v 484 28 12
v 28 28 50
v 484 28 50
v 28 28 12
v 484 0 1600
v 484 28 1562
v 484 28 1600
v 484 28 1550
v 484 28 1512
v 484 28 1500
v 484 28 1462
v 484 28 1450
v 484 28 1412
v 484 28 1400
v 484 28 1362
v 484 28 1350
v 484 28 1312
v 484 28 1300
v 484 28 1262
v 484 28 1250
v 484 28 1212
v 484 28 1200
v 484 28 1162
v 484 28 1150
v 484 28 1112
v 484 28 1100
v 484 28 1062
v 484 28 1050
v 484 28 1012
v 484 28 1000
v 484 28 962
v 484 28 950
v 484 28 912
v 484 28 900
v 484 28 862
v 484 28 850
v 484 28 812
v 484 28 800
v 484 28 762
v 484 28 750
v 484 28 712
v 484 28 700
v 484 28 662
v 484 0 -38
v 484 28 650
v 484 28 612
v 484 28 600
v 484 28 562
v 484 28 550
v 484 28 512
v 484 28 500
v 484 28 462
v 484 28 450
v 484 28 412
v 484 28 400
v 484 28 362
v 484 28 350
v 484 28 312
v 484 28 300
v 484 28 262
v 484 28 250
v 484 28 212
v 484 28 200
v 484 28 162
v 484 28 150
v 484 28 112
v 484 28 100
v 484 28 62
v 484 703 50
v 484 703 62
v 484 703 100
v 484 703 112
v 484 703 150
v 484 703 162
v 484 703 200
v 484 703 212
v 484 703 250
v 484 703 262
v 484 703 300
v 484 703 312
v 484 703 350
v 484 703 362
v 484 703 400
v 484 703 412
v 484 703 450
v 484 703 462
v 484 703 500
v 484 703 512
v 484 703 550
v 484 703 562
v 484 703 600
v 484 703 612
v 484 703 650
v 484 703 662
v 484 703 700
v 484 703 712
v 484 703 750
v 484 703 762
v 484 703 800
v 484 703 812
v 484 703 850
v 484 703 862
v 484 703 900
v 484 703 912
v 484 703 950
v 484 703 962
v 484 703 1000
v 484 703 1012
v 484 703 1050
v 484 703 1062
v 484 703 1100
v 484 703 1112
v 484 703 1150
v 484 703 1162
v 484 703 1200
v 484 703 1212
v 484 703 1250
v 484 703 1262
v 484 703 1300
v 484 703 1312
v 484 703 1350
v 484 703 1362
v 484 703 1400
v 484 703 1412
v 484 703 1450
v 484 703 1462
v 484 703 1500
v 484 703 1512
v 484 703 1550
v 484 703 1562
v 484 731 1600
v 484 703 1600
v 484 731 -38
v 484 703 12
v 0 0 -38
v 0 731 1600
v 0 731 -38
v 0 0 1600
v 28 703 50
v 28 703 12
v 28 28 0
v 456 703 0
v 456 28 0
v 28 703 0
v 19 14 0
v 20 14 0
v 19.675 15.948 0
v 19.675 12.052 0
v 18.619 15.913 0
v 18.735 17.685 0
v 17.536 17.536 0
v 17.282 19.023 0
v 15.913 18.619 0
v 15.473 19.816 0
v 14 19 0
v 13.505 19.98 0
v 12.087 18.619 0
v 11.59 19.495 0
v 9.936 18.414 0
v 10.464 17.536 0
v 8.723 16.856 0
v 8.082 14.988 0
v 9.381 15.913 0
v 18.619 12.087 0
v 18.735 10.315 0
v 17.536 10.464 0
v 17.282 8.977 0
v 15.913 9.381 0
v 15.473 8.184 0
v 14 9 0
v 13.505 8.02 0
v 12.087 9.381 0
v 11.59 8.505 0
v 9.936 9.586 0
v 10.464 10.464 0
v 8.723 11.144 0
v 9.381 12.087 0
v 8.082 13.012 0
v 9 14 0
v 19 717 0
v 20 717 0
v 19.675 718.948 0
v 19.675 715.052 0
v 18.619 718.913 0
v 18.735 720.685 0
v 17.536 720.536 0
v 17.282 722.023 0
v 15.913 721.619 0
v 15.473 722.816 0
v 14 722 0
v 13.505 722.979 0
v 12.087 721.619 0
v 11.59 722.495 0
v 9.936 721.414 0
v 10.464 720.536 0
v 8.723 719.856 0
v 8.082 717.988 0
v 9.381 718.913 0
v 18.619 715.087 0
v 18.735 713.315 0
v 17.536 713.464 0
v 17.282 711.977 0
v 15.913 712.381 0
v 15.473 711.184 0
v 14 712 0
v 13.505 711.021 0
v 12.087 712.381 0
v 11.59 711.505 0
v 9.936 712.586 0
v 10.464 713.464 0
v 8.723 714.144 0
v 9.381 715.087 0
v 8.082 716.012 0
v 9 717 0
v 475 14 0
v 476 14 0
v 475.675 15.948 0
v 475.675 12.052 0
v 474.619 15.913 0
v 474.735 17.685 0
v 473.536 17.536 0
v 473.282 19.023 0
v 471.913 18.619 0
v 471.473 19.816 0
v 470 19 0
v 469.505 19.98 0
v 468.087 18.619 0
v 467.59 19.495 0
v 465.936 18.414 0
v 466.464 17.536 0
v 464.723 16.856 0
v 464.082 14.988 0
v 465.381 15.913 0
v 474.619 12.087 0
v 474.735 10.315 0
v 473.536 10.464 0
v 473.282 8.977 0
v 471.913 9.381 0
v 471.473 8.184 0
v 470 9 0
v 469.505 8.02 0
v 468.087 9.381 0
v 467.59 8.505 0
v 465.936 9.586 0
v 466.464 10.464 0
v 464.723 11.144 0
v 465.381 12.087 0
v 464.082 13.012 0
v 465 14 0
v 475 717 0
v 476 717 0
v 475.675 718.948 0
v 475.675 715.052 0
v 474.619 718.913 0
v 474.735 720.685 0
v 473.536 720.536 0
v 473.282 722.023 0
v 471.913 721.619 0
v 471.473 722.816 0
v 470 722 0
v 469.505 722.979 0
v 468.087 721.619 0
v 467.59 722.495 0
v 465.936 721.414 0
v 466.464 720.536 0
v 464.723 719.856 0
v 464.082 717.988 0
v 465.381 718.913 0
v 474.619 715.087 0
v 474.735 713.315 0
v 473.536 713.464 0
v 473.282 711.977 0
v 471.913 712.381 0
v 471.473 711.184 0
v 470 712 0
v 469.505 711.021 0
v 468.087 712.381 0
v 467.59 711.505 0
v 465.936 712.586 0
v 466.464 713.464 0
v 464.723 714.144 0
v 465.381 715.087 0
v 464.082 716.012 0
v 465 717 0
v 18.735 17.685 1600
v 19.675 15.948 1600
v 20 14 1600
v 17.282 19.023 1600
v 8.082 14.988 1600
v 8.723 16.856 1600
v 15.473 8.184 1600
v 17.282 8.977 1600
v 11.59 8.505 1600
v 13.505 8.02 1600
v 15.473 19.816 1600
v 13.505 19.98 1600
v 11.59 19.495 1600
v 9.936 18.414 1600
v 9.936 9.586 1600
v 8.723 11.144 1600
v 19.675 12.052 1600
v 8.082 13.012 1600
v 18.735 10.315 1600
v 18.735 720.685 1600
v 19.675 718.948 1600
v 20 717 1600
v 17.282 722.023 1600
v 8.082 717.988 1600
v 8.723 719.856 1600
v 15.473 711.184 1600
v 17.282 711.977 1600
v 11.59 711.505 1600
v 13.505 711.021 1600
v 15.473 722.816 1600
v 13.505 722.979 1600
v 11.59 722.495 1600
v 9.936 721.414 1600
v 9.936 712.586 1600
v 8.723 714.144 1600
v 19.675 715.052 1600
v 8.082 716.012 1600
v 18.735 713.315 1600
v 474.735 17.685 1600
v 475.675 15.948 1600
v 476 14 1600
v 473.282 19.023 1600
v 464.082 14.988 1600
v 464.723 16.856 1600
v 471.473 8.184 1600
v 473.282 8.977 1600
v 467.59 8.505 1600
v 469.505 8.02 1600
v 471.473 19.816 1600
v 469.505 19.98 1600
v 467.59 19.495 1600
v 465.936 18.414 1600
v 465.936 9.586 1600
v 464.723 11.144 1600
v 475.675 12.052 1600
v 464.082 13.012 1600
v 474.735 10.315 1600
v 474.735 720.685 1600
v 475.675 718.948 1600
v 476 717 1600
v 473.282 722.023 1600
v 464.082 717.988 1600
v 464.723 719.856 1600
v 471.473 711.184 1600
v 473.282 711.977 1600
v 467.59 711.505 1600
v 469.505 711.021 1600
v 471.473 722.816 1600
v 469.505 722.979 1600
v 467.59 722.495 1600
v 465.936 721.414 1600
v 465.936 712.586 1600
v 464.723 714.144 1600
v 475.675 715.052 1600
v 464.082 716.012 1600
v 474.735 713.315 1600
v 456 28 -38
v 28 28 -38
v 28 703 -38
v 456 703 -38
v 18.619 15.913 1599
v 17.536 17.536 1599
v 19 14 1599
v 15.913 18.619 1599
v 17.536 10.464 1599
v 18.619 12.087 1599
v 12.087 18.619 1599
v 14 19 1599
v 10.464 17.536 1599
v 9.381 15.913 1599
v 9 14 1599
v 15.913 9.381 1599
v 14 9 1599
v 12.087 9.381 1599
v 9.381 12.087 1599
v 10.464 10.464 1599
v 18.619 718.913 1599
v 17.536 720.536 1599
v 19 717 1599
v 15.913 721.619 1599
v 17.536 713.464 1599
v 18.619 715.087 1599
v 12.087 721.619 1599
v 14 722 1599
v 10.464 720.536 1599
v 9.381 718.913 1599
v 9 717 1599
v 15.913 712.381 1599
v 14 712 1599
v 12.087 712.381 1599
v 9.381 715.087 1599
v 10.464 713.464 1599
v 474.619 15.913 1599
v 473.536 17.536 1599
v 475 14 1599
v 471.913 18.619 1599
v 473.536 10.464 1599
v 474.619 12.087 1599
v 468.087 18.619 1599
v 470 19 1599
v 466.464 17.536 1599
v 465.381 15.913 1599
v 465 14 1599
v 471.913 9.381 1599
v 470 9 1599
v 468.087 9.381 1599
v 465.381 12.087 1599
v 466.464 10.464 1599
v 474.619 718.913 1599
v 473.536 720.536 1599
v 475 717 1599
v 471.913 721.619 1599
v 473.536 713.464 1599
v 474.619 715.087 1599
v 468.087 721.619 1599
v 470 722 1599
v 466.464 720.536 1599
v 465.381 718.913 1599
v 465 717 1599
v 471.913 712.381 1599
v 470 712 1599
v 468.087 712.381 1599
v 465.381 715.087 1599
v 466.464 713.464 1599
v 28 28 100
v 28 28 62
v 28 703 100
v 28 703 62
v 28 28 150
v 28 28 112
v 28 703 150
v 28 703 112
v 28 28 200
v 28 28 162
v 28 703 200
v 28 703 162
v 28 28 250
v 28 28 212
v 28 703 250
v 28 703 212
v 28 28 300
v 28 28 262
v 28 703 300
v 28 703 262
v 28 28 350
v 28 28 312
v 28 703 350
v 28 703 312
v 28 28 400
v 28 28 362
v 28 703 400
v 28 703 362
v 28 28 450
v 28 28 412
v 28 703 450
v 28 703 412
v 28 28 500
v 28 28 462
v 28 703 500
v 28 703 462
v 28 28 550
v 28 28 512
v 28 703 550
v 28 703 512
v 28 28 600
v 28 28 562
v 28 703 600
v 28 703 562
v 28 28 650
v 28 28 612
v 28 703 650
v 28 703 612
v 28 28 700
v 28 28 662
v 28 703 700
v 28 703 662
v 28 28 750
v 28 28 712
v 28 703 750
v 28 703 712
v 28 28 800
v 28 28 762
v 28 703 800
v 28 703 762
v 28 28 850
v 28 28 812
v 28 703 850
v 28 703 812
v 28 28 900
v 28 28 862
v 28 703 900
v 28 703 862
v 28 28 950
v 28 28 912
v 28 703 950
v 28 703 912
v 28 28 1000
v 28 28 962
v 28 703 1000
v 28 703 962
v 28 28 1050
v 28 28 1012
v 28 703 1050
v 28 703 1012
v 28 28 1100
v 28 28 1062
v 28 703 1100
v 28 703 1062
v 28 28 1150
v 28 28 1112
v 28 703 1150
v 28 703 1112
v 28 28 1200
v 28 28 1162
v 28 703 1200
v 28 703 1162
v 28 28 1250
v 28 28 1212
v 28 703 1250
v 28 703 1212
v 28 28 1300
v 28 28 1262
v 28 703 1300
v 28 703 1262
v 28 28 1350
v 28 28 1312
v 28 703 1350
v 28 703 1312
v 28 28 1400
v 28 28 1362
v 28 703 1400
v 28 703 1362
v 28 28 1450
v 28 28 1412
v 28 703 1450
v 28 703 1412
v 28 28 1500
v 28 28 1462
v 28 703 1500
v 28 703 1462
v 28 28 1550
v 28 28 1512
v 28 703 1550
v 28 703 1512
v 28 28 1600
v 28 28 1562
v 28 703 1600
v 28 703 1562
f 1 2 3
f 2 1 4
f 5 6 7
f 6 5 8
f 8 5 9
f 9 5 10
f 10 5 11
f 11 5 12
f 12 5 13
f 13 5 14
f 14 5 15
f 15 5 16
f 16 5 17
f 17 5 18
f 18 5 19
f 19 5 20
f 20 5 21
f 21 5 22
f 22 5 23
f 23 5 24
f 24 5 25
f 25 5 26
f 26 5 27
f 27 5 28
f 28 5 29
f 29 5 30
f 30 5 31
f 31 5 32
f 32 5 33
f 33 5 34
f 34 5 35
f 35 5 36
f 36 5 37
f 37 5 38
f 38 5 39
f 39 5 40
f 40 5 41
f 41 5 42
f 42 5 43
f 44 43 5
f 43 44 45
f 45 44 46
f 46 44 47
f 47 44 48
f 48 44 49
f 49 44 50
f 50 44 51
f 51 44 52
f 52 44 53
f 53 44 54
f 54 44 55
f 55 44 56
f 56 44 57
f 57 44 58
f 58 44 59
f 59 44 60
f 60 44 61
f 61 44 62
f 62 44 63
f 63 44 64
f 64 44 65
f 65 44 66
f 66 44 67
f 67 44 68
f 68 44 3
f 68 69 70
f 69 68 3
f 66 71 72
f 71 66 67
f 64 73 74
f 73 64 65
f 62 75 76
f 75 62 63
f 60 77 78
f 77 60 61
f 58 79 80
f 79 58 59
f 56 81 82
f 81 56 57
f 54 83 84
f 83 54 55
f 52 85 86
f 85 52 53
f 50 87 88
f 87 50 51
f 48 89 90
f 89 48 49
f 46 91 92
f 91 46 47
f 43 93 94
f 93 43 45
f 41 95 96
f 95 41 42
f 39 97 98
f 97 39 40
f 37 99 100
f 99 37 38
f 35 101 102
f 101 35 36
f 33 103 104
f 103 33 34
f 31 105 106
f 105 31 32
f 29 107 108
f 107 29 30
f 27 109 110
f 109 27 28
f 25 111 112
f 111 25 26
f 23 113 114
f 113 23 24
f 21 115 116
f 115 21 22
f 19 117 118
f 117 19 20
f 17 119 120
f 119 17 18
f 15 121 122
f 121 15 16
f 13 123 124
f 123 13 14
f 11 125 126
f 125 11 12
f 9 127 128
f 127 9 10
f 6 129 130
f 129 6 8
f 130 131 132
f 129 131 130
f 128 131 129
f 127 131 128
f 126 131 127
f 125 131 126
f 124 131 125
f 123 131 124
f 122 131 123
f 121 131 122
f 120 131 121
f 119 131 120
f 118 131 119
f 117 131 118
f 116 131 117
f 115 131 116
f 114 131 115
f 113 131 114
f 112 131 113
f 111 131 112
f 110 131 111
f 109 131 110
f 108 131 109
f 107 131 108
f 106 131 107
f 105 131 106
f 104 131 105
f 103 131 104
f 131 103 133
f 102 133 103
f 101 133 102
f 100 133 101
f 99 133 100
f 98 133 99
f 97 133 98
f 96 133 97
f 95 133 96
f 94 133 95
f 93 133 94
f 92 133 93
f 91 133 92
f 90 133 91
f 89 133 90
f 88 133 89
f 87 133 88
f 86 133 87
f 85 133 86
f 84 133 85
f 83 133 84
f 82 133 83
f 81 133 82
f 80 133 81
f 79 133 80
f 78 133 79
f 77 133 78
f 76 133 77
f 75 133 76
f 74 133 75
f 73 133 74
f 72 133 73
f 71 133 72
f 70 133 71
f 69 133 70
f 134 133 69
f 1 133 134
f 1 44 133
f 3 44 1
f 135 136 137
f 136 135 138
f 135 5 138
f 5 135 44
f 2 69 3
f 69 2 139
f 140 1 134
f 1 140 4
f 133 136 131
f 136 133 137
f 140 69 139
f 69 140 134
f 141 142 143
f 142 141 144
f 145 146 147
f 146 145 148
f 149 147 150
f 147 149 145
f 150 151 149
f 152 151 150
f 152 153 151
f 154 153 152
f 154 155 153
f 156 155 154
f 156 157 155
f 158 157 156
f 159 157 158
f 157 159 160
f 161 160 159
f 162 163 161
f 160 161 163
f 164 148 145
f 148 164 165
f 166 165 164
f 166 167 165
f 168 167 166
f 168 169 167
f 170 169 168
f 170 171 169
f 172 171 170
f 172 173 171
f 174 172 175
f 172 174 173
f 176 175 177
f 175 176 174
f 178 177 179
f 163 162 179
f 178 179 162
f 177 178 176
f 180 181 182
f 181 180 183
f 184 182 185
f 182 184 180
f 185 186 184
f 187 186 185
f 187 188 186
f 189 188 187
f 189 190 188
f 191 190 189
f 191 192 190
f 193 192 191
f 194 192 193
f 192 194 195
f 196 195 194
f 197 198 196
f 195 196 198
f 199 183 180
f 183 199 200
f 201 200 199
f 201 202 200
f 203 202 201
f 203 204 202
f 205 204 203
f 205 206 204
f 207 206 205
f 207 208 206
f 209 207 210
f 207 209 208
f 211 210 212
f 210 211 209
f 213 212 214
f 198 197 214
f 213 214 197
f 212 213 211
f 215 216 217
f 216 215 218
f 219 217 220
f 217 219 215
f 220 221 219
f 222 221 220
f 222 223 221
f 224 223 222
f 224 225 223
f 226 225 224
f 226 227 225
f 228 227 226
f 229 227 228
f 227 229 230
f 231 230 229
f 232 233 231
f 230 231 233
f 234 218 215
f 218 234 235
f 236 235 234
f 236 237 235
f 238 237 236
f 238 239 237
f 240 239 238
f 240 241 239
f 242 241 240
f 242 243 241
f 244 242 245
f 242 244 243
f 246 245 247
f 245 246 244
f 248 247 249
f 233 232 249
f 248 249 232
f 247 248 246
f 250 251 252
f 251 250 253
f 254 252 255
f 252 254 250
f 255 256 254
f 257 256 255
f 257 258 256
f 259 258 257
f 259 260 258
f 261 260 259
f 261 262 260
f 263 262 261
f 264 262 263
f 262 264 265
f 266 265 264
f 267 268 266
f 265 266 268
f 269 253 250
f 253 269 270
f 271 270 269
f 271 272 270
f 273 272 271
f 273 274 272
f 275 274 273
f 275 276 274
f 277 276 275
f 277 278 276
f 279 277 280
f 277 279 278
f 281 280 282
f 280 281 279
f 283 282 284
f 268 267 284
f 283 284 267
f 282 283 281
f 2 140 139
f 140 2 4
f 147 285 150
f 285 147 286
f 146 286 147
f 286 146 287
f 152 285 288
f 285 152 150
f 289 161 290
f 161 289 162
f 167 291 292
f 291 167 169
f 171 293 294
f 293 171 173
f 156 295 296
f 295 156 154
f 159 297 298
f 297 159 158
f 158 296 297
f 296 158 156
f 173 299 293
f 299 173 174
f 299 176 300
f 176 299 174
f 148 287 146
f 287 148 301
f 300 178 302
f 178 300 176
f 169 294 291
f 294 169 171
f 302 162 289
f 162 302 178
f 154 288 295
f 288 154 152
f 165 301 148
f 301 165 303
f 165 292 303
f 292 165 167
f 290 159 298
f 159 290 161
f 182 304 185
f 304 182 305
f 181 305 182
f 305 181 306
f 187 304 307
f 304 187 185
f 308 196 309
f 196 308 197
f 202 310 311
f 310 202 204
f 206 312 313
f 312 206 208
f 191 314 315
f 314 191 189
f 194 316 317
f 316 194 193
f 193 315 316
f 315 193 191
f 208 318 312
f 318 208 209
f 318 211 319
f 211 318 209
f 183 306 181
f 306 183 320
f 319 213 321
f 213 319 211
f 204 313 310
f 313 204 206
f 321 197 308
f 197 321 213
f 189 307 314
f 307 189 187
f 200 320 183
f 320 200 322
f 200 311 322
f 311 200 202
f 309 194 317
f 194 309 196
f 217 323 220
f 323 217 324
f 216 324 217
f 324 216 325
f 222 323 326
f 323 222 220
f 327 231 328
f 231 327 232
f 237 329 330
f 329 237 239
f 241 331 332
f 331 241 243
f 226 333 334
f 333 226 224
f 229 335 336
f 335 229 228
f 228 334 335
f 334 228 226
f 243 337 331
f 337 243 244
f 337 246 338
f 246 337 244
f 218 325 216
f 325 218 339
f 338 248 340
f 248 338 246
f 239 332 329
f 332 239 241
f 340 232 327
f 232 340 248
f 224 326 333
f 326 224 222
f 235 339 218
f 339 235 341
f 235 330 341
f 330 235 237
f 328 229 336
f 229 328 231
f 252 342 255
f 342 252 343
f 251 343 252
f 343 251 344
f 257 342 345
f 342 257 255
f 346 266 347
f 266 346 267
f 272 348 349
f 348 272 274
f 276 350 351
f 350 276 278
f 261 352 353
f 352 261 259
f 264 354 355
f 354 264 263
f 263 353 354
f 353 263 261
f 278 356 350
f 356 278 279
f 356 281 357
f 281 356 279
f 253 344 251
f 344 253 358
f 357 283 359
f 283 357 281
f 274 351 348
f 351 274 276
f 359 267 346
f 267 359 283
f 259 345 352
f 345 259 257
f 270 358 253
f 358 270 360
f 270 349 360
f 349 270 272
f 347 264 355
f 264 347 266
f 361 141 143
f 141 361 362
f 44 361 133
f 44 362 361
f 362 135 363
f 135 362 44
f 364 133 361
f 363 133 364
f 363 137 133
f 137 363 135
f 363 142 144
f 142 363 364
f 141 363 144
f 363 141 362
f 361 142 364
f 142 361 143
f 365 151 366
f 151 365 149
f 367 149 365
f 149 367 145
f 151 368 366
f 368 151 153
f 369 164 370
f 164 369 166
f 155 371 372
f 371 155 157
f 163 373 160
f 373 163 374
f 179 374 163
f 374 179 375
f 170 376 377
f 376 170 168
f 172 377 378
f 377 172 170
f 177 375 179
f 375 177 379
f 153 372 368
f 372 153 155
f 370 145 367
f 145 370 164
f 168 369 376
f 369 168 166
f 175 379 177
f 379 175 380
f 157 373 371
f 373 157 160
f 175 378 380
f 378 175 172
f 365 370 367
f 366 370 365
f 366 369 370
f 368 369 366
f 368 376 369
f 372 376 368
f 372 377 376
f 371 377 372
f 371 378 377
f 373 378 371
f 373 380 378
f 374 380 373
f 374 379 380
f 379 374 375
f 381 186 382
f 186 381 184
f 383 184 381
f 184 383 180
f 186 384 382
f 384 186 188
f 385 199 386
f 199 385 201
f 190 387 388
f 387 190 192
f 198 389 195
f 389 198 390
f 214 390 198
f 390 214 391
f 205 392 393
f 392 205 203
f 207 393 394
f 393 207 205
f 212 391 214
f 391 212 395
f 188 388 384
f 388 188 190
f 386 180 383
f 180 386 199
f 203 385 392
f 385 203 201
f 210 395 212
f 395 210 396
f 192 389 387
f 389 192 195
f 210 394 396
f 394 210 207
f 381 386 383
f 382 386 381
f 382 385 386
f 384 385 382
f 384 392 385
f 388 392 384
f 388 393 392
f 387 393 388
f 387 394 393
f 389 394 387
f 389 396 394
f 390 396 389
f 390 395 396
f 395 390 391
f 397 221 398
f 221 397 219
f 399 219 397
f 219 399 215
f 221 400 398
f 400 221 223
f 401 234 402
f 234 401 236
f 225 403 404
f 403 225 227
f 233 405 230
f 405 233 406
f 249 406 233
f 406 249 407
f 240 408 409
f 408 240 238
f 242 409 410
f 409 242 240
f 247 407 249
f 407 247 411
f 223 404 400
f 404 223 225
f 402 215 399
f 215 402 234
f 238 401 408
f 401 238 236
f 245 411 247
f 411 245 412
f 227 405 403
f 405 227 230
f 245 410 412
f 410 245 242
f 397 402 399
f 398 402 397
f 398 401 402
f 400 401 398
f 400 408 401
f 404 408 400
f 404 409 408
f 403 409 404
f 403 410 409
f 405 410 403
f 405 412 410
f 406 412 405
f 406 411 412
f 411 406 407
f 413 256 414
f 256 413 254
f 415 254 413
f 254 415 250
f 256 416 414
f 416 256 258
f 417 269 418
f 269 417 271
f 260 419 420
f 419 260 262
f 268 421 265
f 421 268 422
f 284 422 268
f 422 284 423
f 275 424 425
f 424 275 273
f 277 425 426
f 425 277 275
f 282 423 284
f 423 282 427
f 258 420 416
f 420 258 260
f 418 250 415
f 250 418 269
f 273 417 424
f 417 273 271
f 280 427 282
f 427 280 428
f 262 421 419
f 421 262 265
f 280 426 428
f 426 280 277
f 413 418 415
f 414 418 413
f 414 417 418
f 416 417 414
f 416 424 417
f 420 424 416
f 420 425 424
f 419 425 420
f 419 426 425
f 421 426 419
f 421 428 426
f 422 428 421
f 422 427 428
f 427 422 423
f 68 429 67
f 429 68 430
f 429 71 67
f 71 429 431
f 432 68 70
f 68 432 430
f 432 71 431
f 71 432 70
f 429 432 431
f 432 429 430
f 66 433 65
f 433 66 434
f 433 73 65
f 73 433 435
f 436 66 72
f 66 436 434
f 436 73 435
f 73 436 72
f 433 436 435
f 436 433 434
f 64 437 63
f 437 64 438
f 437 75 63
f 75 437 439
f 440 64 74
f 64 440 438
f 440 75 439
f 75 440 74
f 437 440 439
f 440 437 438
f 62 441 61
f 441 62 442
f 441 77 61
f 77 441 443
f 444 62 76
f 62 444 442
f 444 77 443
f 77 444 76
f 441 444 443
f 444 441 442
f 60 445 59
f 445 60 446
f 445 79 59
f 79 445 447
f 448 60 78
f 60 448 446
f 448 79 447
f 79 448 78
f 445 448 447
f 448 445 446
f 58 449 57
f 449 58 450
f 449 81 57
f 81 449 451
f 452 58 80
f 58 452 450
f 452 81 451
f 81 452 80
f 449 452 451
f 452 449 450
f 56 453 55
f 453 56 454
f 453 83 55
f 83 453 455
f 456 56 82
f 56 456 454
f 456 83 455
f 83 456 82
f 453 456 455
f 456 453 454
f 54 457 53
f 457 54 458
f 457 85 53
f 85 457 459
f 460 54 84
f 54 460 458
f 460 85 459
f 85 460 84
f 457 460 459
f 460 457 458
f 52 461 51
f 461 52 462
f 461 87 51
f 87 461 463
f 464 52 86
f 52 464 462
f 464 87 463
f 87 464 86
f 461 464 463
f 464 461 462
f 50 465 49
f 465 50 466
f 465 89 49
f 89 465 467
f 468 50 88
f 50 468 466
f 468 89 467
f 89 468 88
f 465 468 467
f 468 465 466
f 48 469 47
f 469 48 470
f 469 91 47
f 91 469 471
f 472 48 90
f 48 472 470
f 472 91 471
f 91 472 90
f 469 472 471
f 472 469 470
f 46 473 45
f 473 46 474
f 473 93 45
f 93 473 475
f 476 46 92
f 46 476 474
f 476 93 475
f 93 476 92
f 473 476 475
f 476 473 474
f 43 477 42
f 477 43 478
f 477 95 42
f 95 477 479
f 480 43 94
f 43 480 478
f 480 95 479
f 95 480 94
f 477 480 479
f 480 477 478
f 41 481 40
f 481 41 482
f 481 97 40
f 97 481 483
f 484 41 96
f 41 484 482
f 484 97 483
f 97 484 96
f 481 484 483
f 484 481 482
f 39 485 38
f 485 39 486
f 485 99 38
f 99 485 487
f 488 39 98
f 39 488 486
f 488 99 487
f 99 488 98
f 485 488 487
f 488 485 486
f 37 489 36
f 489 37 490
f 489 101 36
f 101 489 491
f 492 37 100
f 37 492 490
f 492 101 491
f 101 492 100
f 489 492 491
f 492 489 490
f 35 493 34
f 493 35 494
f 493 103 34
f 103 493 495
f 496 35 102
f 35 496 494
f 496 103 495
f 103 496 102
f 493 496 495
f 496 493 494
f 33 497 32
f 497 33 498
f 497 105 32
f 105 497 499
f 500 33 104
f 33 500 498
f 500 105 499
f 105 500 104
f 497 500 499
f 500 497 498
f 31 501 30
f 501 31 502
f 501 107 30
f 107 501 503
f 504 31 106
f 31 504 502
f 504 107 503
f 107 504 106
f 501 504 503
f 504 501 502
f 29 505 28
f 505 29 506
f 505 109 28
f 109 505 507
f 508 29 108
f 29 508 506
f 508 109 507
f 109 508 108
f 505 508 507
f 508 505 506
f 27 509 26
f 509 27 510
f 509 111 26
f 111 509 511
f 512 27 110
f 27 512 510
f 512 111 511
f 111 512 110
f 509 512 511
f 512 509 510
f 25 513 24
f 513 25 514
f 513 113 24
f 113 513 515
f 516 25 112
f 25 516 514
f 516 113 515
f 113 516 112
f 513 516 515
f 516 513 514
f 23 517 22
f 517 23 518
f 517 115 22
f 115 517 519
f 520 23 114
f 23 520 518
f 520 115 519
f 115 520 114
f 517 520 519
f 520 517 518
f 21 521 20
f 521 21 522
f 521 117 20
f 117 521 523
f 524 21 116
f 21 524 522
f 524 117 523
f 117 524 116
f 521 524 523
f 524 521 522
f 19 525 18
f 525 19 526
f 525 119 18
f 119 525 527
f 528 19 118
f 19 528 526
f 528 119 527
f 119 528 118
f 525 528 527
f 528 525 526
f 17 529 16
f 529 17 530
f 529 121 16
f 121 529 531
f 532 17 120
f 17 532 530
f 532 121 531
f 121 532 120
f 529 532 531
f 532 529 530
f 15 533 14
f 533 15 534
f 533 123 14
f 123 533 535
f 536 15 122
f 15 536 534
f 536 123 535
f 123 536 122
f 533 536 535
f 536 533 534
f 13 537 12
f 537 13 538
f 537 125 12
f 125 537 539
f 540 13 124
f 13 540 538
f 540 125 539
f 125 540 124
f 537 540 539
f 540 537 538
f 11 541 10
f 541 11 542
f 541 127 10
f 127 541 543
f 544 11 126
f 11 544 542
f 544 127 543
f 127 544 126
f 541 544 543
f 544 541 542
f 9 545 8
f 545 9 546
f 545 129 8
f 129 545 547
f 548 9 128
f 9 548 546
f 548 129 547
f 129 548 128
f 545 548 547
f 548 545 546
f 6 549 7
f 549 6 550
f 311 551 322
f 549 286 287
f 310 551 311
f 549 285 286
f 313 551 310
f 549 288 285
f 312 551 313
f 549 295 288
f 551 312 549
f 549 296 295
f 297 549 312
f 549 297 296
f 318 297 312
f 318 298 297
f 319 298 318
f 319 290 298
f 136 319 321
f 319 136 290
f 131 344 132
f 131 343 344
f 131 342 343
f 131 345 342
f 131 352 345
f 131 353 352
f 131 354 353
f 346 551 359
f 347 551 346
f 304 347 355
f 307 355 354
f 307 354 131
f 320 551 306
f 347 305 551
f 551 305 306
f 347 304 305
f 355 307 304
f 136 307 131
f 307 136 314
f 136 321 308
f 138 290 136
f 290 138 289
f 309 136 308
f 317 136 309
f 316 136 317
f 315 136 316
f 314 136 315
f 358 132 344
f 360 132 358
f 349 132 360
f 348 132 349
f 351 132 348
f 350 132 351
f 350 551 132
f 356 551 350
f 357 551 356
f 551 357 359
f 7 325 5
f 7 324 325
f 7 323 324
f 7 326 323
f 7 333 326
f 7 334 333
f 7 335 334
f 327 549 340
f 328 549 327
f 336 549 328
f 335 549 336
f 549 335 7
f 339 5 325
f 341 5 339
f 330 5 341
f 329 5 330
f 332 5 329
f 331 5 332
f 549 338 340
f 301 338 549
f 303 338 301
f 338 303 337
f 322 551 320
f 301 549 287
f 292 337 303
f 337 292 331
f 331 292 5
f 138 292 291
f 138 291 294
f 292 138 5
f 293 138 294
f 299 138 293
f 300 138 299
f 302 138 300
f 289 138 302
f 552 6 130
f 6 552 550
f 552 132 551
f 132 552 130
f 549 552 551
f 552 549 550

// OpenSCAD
/*
Variables to modify to mess with the basics:

mdf_shelf_thickness is the thickness of the shelf material.
shelf_count is the number of shelves you want.
shelf_spacing is how much of a gap you want between each shelf.

The other variables are fairly standard, play around!
*/

// Part Definitions

mdf_shelf_thickness = 12;
mdf_shelf_width = 484;
mdf_shelf_depth = 731;
mdf_color = "red";
cls_thickness = 28;
cls_height = 38;
cls_color = "green";
studding_diameter = 10;

// Drill holes for studding

hole_fudge = 2;
hole_offset = 14;
hole_diameter = studding_diameter + hole_fudge;

// Material specs
mdf_shelves_per_mdf_sheet = 8;
full_cls_length = 2400;

shelf_spacing = 0;
shelf_count = 32;

// CLS Long lengths

cls_long_length_count = shelf_count + 1;
cls_long_length_per_cls =
  floor(full_cls_length / mdf_shelf_depth);
cls_long_length_cls_count =
  ceil(cls_long_length_count / cls_long_length_per_cls);

// CLS Short lengths

cls_short_length_count = (shelf_count * 2) + 2;
cls_short_length_per_cls =
  floor(full_cls_length / mdf_shelf_width);
cls_short_length_cls_count =
  ceil(cls_short_length_count / cls_short_length_per_cls);

// Totals

total_height = (mdf_shelf_thickness + cls_thickness)*shelf_count + (shelf_spacing * (shelf_count - 1)) + cls_thickness;
total_width = mdf_shelf_width;
total_depth = mdf_shelf_depth;

// Material Counting

total_mdf_sheets = ceil(shelf_count / mdf_shelves_per_mdf_sheet);
total_cls_lengths = ceil((cls_long_length_cls_count + cls_short_length_cls_count)/2);

// Printing Data

echo(str("Total Height: ", total_height, "mm"));
echo(str("Total Width: ", total_width, "mm"));
echo(str("Total Depth: ", total_depth, "mm"));

echo(str("MDF Shelf Count: ", shelf_count));
echo(str("CLS short length Count: ", cls_short_length_count));
echo(str("CLS long length Count: ", cls_long_length_count));

echo(str("Total MDF Sheets: ", total_mdf_sheets));
echo(str("Total CLS Lengths: ", total_cls_lengths));

// Design Layout

bottom_shelf();

for(z = [1 : shelf_count-1])
  translate([
    0,
    0,
    (mdf_shelf_thickness + cls_height + shelf_spacing) * z
  ])
    shelf_construct();

// Modules

module bottom_shelf() {
  shelf_construct();
  for(y = [0,mdf_shelf_depth-cls_thickness])
    translate([0,y,-cls_height])
      rotate([90,0,90])
        cls_bar(mdf_shelf_width);
  for(x = [0,mdf_shelf_width-cls_thickness])
    translate([x + cls_thickness, cls_thickness, -cls_height])
      rotate([90,0,180])
        cls_bar(mdf_shelf_depth - (cls_thickness * 2), "yellow");
  for(x = [hole_offset, mdf_shelf_width - hole_offset])
    for(y = [hole_offset, mdf_shelf_depth - hole_offset])
      translate([x,y,-1])
        cylinder(d=studding_diameter,h=(mdf_shelf_thickness + cls_height+ shelf_spacing)*shelf_count - shelf_spacing);
}

module shelf_construct() {
  difference() {
    union() {
      mdf_shelf();
      for(y = [0,mdf_shelf_depth-cls_thickness])
        translate([0,y,mdf_shelf_thickness])
          rotate([90,0,90])
            cls_bar(mdf_shelf_width);
      translate([cls_thickness, cls_thickness, mdf_shelf_thickness])
        rotate([90,0,180])
          cls_bar(mdf_shelf_depth - (cls_thickness * 2), "yellow");
    }
    for(x = [hole_offset, mdf_shelf_width - hole_offset])
      for(y = [hole_offset, mdf_shelf_depth - hole_offset])
        translate([x,y,-1])
          cylinder(d=hole_diameter,h=mdf_shelf_thickness + cls_height + 2);
  }
}

module mdf_shelf(my_color = mdf_color) {
  color(my_color)
    cube([mdf_shelf_width,mdf_shelf_depth,mdf_shelf_thickness]);
}

module cls_bar(length = 100, my_color = cls_color) {
  color(my_color)
    cube([cls_thickness,cls_height,length]);
}
